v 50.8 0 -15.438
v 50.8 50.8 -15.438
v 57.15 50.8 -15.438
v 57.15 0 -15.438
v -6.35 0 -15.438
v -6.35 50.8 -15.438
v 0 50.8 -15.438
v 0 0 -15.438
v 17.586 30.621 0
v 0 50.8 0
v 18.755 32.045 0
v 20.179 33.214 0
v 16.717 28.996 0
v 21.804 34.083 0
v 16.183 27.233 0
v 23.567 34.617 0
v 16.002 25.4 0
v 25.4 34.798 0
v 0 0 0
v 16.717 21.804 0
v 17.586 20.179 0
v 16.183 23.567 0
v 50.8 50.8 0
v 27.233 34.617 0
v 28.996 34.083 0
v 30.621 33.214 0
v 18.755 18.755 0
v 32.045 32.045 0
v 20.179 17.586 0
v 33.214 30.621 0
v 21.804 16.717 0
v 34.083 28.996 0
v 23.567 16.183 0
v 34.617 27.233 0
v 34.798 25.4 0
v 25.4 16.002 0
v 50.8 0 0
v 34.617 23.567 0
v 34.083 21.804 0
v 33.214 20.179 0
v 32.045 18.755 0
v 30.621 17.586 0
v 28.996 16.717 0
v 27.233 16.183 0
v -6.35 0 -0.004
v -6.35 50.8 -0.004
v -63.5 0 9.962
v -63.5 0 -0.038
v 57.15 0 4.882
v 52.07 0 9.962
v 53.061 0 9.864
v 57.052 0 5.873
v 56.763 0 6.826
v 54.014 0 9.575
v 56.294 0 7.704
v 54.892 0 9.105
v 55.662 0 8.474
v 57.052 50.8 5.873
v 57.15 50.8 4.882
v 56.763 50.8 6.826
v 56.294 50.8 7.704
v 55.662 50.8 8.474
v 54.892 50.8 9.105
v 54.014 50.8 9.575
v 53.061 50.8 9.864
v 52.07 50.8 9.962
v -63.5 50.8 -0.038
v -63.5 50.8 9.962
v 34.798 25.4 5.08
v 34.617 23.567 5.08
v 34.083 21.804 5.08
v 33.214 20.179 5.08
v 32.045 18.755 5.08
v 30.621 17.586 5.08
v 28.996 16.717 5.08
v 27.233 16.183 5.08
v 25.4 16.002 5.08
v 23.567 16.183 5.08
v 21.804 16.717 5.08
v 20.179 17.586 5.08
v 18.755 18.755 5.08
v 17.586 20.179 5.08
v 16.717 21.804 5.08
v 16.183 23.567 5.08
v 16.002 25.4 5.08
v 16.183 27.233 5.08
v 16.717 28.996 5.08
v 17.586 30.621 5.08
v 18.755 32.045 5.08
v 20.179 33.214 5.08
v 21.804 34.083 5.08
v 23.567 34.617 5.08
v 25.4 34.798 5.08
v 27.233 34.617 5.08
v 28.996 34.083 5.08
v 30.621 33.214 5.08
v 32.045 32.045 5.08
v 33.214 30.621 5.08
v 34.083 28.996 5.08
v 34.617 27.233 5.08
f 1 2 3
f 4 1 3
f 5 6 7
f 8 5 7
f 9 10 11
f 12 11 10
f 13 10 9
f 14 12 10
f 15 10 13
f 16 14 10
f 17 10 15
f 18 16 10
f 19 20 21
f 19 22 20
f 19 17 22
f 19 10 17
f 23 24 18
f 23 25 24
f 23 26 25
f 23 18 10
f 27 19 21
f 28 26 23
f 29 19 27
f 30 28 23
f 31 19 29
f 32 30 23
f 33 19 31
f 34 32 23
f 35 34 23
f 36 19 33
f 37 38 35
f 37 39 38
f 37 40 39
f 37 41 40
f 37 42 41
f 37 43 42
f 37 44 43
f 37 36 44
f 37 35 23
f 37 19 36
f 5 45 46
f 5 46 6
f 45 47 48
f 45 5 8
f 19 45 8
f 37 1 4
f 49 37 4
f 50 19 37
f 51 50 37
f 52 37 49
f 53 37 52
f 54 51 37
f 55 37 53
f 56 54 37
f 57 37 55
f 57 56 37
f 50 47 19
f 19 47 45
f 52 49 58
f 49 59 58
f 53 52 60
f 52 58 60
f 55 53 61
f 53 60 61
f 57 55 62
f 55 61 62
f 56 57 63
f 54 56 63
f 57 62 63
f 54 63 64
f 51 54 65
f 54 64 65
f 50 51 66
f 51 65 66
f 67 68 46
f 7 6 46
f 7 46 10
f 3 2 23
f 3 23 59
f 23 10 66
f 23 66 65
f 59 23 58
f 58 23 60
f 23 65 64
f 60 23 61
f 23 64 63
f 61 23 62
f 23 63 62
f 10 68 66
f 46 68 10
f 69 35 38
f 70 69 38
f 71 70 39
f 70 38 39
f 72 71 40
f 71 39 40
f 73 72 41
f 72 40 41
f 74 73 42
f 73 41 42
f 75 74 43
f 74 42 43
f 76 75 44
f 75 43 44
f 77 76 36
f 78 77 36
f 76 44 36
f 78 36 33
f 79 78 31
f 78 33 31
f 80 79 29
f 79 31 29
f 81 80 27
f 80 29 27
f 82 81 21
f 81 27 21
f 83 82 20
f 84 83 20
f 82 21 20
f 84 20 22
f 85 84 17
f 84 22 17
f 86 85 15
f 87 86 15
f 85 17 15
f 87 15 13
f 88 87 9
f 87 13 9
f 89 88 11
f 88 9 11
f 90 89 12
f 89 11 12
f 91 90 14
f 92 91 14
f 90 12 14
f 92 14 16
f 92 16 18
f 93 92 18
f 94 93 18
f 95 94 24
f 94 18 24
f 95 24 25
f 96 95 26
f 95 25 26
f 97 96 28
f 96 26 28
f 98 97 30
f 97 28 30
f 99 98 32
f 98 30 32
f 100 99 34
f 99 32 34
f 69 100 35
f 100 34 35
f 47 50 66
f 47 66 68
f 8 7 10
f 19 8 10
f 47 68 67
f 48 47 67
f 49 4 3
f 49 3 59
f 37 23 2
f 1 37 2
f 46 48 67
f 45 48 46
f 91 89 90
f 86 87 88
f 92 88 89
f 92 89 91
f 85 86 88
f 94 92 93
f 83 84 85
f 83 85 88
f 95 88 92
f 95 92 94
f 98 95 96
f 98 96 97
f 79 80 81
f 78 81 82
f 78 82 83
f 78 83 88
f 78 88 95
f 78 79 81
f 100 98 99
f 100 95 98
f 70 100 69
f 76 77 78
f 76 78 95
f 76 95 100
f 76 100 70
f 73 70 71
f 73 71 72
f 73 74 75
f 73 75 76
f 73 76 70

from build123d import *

# Parameters (mm, degrees)
F1_DEPTH = 50.8
F2_R     = 5.08
F3_R     = 9.398
F4_DEPTH = 5.08


with BuildPart() as f1:
    # F0 (on Front) → F1 (new body)
    with BuildSketch(Plane.XZ):
        Polygon((0, -15.438433), (0, 0), (50.8, 0), (50.8, -15.438433), (57.15, -15.438433), (57.15, 9.961567), (50.8, 9.961567), (0, 9.961567), (-6.35, 9.961567), (-63.5, 9.961567), (-63.5, -0.038433), (-6.35, -0.003843), (-6.35, -15.438433), align=None)
    extrude(amount=-F1_DEPTH)

    # F2
    f2_edges = [f1.edges().sort_by_distance(p)[0] for p in [
        (57.15, 25.4, 9.961567),
    ]]
    fillet(f2_edges, radius=F2_R)

    # F3 (on face) → F4 (cut)
    with BuildSketch(Plane(origin=(0, 0, 0), x_dir=(1, 0, 0), z_dir=(0, 0, -1))):
        with Locations((25.4, -25.4)):
            Circle(F3_R)
    extrude(amount=-F4_DEPTH, mode=Mode.SUBTRACT)


solid = f1.part
